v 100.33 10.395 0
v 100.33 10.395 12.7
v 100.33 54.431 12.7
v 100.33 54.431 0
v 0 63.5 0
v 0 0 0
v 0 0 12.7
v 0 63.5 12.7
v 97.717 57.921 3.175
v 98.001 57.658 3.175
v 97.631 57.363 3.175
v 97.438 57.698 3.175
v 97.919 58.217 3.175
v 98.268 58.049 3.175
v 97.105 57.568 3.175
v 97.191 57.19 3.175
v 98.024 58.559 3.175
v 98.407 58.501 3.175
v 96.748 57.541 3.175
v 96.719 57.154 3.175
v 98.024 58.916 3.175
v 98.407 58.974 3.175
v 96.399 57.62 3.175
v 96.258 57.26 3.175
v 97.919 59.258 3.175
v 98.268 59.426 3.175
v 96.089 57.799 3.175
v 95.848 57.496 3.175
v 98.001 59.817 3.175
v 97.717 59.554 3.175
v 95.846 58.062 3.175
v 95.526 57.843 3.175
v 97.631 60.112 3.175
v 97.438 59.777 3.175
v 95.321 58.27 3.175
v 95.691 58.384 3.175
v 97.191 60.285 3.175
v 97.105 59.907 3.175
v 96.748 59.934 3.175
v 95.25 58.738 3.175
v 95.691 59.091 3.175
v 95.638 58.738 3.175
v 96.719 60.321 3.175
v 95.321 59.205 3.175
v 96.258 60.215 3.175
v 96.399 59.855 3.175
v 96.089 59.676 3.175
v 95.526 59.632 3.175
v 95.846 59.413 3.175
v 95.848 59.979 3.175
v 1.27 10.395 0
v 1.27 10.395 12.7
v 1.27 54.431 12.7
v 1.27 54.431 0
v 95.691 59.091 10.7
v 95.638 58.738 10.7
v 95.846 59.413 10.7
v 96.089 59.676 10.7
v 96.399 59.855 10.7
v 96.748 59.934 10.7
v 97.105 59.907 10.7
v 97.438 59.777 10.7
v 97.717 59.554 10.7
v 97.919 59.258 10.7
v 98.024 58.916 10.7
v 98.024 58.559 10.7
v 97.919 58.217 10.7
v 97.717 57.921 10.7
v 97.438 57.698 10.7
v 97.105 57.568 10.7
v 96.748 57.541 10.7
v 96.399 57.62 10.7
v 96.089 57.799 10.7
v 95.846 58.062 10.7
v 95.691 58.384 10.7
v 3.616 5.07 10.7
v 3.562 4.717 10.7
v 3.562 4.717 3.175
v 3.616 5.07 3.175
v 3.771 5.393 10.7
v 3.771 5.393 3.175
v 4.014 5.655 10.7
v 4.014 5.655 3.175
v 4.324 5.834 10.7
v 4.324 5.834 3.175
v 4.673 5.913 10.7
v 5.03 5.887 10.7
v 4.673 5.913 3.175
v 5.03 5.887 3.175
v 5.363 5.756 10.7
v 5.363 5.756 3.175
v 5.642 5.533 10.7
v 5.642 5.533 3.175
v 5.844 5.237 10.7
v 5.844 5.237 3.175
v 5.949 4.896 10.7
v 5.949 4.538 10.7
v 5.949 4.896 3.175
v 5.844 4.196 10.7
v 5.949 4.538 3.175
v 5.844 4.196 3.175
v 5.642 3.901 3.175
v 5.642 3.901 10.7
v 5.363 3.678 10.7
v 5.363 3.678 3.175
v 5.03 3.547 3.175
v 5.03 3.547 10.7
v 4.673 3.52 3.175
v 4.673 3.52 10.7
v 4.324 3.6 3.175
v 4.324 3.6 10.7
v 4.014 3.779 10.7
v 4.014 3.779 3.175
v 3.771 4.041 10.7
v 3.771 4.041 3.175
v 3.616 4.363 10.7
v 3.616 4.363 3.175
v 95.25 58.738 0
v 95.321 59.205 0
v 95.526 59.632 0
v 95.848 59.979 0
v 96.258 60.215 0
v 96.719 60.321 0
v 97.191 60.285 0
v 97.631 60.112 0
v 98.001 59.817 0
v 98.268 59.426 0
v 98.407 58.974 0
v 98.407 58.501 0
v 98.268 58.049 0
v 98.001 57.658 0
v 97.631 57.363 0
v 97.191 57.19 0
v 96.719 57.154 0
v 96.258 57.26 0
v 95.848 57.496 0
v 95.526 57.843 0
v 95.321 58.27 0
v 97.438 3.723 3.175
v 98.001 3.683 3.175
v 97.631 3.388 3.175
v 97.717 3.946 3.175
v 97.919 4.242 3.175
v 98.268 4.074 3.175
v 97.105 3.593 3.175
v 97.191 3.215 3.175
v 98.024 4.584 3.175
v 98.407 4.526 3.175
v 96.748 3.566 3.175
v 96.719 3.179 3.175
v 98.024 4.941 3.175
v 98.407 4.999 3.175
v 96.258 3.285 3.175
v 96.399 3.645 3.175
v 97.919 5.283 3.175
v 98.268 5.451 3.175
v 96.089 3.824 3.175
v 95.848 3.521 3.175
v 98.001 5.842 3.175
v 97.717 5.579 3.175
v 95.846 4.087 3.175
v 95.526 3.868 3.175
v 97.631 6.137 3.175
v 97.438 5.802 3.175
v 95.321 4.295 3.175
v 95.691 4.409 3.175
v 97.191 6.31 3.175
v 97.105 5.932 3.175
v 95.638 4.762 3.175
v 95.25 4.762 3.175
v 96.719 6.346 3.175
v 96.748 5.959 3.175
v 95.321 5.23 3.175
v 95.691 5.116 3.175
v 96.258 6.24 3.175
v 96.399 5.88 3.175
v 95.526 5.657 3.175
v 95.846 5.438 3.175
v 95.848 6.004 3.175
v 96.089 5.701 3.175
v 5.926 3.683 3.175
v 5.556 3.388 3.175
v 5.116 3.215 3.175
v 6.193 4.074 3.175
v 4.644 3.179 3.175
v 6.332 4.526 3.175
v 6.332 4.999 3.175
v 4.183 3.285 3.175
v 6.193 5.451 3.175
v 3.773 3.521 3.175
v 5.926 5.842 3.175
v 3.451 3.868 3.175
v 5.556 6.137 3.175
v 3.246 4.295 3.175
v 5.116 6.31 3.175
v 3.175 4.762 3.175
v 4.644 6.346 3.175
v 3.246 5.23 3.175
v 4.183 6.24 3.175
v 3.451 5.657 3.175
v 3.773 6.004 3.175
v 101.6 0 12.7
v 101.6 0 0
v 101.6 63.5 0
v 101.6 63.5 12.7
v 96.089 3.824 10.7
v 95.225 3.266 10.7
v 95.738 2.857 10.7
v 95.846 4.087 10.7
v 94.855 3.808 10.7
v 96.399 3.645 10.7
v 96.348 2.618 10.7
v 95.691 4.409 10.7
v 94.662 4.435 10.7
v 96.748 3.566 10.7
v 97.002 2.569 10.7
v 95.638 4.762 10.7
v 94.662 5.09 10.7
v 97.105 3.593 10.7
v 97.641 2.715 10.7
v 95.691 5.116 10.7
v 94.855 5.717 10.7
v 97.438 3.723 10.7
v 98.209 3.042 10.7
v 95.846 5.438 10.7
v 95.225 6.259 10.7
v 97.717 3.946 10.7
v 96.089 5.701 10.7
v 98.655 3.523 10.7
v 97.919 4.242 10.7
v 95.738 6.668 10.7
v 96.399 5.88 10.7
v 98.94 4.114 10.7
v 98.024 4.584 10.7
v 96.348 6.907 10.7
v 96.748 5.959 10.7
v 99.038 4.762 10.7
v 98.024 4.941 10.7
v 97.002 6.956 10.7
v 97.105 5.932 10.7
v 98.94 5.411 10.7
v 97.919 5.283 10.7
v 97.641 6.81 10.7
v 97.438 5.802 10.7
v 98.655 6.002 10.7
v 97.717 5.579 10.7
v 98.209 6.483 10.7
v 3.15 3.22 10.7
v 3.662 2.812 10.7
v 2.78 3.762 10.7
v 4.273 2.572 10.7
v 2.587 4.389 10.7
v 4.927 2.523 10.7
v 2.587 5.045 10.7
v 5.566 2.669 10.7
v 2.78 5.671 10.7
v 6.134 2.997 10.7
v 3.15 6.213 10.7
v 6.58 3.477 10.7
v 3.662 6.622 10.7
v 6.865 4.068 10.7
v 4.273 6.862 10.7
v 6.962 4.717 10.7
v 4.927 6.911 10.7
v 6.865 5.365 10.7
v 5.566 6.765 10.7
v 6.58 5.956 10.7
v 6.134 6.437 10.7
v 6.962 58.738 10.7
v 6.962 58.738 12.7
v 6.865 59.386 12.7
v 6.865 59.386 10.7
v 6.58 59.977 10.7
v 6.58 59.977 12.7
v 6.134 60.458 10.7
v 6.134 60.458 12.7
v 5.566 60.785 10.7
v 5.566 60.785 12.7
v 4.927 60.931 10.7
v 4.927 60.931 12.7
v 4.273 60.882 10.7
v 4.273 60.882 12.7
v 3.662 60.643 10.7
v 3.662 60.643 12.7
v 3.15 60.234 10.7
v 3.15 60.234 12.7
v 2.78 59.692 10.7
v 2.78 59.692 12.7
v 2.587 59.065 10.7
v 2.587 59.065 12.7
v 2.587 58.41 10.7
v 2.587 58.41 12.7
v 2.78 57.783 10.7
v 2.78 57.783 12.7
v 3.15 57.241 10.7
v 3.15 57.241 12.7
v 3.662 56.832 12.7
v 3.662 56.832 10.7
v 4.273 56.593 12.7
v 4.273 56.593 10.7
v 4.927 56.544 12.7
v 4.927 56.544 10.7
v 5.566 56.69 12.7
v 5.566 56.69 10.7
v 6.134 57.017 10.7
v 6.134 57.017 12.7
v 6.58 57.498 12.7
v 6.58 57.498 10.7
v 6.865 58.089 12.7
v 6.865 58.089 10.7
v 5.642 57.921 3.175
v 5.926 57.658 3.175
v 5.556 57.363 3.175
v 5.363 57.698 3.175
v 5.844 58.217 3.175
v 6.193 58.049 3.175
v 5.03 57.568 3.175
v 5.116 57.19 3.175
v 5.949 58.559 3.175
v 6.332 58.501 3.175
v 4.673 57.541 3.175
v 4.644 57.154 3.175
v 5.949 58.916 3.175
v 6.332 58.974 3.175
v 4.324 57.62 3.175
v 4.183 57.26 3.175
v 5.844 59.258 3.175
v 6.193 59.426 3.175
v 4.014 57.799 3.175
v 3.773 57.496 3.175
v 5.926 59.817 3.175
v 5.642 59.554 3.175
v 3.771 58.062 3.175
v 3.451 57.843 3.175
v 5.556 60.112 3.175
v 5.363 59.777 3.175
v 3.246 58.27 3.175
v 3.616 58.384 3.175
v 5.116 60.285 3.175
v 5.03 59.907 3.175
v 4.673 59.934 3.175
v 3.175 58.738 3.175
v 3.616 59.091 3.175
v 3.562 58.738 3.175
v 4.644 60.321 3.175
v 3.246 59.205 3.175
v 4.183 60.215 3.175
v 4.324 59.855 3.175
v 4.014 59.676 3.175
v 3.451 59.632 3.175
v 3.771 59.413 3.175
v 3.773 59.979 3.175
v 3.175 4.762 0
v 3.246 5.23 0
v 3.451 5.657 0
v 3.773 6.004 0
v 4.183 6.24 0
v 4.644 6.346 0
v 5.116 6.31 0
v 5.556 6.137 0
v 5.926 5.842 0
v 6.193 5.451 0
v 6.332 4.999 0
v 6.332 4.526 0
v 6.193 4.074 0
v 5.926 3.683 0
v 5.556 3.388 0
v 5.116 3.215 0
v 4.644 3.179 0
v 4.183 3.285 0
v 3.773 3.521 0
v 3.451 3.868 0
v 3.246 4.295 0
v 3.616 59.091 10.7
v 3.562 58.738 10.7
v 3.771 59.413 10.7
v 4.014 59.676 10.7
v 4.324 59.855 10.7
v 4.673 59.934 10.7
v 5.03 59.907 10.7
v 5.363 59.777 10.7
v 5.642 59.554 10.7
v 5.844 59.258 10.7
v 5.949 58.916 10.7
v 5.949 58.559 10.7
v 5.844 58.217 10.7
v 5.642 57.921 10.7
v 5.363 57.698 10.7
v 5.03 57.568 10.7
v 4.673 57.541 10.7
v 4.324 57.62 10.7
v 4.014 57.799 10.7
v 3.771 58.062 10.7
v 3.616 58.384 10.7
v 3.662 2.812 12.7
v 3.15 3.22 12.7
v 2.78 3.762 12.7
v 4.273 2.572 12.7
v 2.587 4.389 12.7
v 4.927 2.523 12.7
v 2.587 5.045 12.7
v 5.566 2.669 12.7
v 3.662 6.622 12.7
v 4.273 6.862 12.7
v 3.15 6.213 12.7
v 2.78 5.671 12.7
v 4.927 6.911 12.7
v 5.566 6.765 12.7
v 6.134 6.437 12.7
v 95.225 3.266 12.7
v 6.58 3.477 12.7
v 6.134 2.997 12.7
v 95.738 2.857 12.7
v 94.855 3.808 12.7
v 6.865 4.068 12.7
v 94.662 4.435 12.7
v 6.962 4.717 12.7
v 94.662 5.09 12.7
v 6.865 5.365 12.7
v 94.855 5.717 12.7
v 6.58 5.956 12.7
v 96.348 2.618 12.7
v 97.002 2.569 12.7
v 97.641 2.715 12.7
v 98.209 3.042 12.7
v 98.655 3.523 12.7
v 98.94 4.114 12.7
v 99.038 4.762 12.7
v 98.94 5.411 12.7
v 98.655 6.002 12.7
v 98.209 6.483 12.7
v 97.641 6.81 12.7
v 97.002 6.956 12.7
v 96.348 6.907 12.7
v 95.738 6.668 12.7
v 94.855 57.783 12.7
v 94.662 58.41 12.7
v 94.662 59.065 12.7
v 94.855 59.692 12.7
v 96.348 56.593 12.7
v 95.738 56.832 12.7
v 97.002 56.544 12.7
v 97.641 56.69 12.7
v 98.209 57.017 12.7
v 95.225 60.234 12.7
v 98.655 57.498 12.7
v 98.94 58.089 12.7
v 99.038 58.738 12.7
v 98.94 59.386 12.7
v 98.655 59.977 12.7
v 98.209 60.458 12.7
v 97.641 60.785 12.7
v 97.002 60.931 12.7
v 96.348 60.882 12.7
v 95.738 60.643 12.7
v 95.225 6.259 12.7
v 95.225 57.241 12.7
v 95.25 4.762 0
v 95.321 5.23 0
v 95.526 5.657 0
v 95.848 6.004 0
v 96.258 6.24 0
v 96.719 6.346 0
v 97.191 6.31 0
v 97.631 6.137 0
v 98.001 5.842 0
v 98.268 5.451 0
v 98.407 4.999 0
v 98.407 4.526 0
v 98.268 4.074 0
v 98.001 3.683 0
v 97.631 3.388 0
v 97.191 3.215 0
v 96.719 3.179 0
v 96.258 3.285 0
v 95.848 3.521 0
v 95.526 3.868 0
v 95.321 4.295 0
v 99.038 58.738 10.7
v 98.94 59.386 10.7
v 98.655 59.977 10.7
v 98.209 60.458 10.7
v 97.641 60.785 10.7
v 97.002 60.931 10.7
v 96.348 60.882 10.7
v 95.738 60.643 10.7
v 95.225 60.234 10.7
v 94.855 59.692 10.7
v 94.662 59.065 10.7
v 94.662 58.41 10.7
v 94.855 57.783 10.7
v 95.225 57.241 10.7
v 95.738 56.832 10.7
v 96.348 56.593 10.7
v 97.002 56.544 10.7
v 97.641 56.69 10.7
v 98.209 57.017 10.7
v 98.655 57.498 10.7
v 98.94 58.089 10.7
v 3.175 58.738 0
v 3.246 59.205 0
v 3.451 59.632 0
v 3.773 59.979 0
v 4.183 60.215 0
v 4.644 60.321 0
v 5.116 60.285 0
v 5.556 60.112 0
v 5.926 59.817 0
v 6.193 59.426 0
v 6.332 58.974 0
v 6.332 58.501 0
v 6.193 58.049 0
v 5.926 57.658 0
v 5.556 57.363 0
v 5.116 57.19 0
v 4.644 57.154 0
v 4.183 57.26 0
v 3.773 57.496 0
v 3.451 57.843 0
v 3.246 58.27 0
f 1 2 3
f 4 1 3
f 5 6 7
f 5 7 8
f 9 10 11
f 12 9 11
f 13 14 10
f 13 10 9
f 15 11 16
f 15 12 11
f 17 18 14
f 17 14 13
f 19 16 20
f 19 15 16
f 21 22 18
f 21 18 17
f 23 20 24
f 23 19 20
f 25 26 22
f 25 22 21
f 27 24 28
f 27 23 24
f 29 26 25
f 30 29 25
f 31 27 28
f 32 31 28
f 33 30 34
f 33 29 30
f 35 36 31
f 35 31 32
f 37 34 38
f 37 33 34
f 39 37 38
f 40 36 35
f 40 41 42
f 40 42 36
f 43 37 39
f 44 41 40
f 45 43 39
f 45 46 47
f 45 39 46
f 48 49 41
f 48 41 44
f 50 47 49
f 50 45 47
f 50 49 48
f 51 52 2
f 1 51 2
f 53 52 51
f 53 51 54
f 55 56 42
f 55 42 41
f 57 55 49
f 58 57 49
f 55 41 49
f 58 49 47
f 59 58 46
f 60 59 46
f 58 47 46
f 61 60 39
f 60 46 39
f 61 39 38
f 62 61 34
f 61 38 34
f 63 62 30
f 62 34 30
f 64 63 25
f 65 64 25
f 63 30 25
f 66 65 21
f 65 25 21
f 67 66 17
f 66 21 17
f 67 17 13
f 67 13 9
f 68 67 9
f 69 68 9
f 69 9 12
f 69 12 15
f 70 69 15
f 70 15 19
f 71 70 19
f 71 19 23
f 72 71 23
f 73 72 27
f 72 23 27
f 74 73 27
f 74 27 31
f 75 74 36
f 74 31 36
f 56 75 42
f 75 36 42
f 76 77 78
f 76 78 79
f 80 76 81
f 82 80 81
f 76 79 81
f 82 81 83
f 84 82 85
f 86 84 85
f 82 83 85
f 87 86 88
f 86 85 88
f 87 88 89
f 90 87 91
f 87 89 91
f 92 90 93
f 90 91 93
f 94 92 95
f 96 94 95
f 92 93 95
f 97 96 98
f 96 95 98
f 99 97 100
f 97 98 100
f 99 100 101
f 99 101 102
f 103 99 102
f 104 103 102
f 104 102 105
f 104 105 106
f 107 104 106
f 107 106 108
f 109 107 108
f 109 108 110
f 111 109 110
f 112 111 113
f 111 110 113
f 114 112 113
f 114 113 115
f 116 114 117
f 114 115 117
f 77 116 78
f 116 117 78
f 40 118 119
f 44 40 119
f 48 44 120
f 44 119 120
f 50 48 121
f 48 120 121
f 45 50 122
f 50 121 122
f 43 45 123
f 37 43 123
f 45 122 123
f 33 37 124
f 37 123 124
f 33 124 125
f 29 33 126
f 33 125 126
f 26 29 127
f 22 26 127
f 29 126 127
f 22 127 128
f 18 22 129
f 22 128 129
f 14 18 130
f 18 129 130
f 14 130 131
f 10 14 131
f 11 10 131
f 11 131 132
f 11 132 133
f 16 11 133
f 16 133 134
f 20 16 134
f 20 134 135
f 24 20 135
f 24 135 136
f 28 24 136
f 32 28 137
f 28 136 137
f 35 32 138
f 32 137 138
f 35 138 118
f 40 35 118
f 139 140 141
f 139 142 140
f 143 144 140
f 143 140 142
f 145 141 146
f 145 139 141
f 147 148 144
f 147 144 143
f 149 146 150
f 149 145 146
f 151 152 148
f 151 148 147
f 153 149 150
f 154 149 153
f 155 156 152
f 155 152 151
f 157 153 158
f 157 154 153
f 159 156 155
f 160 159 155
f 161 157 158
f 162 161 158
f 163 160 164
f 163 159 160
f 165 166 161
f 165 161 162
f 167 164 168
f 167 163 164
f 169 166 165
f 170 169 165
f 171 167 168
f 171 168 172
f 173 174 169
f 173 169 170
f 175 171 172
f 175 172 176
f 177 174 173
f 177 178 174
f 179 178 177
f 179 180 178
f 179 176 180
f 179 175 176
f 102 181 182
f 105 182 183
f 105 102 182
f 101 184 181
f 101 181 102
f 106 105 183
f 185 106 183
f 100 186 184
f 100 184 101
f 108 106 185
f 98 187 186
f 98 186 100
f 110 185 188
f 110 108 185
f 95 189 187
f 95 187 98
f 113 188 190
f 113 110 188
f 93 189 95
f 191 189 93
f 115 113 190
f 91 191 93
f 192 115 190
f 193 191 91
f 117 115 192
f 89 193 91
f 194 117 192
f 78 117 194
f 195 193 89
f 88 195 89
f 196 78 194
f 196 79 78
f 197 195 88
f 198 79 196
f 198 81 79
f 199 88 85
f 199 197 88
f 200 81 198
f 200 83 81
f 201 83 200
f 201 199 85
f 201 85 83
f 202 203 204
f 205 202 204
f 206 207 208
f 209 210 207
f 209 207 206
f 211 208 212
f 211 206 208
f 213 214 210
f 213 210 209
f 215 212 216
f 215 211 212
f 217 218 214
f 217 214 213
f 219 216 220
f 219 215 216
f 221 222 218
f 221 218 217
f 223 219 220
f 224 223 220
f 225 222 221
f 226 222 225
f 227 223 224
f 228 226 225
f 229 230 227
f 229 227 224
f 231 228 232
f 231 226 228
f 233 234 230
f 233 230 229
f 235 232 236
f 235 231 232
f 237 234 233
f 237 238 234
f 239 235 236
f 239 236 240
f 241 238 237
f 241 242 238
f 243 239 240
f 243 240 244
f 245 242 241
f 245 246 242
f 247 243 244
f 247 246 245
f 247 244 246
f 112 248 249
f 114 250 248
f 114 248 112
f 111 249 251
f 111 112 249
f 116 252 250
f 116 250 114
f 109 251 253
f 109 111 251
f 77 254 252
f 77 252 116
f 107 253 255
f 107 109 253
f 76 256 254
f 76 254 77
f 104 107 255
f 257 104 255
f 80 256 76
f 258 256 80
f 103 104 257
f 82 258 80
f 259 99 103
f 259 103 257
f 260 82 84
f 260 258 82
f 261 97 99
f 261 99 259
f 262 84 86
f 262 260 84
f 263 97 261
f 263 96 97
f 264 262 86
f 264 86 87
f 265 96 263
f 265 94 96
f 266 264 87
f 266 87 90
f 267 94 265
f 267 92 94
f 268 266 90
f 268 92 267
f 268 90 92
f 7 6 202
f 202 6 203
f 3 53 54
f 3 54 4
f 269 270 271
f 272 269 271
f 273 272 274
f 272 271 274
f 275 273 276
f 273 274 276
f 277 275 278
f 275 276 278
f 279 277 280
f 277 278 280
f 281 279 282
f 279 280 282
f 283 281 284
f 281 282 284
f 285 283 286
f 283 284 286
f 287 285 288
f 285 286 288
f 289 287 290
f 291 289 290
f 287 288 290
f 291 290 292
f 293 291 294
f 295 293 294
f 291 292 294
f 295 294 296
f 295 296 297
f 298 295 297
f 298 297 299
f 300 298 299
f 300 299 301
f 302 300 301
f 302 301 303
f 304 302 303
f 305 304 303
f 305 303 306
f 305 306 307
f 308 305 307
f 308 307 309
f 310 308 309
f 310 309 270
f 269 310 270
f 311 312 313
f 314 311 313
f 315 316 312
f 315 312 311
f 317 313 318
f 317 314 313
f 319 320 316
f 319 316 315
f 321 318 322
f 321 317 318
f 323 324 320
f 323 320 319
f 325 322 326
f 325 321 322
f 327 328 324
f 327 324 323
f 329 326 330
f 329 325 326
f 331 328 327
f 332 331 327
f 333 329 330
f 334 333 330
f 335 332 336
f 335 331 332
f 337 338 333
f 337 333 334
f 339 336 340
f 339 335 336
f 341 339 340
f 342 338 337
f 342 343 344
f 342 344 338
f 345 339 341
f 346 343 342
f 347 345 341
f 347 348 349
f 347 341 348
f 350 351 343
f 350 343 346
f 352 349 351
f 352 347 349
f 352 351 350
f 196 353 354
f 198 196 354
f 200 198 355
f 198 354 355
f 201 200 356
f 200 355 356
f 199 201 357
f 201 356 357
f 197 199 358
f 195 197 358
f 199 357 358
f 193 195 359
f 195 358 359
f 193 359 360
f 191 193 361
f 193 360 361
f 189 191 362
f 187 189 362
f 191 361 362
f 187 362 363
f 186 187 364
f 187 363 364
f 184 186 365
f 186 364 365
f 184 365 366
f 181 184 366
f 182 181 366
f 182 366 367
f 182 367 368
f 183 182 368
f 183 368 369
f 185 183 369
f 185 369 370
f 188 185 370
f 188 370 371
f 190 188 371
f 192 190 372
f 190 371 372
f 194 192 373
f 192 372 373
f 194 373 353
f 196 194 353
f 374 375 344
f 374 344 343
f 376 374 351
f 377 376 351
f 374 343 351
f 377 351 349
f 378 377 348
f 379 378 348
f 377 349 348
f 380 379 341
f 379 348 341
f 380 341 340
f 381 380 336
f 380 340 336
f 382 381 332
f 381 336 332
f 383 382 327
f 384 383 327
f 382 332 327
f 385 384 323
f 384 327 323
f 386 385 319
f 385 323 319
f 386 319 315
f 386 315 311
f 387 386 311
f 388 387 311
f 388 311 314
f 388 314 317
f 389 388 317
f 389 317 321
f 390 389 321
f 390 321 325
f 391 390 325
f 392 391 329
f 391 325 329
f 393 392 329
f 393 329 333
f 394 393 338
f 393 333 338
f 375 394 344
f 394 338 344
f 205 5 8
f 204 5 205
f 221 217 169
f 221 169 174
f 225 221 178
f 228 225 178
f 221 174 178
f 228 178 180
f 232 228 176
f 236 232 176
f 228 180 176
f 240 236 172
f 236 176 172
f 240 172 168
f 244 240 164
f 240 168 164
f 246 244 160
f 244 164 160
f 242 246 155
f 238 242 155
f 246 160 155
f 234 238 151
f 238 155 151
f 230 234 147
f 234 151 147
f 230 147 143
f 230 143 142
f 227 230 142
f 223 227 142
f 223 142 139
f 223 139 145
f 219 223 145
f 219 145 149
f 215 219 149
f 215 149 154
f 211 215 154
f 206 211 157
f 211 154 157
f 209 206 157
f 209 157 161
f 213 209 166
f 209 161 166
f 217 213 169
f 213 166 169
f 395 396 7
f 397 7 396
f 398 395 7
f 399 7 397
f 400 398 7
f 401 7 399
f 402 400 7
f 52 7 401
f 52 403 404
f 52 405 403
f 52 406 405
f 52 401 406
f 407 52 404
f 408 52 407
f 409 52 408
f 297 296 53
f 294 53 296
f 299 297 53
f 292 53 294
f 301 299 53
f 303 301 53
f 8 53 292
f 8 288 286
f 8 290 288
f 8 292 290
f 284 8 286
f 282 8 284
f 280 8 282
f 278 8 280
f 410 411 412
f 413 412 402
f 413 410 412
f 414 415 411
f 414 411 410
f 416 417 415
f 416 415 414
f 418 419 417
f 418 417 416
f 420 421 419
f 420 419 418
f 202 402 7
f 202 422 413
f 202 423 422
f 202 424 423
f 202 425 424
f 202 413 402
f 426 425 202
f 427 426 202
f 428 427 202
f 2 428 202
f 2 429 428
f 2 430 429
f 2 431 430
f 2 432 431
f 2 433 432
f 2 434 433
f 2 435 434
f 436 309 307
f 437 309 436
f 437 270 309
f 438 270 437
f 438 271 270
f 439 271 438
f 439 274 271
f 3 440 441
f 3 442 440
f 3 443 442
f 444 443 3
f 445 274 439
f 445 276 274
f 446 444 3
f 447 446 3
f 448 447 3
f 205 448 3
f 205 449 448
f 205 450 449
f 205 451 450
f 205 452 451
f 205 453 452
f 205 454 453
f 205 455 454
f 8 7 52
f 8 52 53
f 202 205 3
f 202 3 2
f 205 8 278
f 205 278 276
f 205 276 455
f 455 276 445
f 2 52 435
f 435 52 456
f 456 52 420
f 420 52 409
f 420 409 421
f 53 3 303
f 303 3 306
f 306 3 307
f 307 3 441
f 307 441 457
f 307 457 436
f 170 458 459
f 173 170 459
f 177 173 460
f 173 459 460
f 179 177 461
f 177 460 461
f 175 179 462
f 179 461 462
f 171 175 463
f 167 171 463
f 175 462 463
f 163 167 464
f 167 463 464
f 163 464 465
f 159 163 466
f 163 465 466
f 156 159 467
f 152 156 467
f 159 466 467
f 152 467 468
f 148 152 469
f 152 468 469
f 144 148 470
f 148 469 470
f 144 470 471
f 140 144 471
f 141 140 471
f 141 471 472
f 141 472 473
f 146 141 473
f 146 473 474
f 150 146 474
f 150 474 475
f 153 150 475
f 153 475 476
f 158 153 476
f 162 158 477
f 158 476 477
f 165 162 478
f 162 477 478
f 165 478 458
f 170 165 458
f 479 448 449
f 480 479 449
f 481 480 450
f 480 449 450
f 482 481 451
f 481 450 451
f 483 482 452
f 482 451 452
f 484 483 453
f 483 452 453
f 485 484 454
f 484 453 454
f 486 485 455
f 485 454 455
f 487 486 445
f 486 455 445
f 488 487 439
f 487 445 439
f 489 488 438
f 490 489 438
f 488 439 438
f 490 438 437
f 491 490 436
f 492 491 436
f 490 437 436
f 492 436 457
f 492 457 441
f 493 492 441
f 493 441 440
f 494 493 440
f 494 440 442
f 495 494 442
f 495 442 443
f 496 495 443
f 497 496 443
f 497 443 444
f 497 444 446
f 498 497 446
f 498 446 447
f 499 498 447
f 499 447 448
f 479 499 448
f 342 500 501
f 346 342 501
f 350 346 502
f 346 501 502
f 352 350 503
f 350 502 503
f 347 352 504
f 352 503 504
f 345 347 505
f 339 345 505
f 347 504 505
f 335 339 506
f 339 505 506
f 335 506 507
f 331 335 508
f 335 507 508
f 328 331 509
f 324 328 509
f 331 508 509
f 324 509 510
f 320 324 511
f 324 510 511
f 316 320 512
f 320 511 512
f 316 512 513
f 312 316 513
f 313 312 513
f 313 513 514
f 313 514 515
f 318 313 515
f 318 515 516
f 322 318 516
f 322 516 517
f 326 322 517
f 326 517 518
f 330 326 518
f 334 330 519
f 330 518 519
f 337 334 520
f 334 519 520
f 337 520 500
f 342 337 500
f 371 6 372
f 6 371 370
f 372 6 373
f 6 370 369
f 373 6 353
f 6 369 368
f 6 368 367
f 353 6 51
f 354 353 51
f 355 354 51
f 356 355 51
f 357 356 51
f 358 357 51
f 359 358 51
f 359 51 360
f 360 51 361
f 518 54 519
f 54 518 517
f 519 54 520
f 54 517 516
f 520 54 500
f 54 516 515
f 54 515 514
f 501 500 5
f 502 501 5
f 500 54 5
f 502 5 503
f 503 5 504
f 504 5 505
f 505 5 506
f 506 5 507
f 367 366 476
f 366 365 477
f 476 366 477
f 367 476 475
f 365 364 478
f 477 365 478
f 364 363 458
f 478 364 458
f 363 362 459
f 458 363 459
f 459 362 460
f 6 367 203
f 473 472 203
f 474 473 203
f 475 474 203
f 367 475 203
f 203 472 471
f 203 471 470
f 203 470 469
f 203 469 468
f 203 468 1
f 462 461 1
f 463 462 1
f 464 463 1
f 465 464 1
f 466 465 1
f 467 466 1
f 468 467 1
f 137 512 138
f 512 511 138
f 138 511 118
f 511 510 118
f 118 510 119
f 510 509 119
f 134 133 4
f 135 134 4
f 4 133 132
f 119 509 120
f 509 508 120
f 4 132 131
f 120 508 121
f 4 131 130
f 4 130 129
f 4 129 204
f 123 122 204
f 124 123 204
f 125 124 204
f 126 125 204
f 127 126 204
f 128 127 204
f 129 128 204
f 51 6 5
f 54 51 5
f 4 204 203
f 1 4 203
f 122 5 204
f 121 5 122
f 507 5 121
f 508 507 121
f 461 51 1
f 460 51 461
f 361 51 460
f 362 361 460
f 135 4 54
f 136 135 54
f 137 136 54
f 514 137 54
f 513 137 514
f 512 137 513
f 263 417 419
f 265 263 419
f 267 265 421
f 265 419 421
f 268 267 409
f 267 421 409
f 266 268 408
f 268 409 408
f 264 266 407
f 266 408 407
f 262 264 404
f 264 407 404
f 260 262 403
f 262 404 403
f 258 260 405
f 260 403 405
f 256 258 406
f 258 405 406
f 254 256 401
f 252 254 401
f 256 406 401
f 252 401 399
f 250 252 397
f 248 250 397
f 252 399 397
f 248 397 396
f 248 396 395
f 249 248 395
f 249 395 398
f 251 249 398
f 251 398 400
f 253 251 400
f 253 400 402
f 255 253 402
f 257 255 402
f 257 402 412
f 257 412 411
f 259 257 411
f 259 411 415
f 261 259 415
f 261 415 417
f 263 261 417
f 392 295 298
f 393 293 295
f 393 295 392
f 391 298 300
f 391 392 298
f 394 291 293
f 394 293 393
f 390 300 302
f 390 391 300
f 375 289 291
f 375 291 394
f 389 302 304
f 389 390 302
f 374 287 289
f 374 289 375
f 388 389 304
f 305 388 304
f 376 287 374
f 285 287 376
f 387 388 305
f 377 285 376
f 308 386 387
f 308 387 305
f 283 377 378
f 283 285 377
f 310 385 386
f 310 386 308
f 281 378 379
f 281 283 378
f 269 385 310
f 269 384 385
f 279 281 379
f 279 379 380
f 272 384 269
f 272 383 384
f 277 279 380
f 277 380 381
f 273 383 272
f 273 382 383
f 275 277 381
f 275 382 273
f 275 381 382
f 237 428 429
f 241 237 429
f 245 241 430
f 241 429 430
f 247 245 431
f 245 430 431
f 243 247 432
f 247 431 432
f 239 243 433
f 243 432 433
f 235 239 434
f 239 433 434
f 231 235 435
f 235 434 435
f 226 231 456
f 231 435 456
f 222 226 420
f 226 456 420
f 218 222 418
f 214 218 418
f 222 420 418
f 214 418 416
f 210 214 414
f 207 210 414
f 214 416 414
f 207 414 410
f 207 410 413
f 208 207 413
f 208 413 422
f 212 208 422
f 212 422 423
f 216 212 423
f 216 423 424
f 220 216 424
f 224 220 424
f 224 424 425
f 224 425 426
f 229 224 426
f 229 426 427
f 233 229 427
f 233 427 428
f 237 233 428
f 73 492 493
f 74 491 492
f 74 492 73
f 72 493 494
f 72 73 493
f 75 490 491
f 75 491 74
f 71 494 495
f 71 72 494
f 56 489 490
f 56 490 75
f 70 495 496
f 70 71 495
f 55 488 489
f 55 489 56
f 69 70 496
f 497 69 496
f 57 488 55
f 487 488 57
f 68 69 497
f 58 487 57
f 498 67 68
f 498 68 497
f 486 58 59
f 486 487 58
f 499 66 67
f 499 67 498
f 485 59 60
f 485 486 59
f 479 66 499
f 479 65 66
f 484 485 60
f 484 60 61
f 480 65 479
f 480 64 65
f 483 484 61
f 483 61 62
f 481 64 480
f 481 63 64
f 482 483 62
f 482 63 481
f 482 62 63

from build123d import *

# Parameters (mm, degrees)
SKETCH1_W                      = 101.6
SKETCH1_H                      = 63.5
BOSS_EXTRUDE1_DEPTH            = 12.7
SKETCH2_W                      = 99.06
SKETCH2_H                      = 44.03588005
CUT_EXTRUDE1_DEPTH             = 12.7
SKETCH3_R                      = 1.5875
CUT_EXTRUDE2_DEPTH             = 3.175
CBORE_FOR_M2_SHCS1_D           = 2.4
CBORE_FOR_M2_SHCS1_CBORE_D     = 4.4
CBORE_FOR_M2_SHCS1_CBORE_DEPTH = 2


with BuildPart() as part:
    # Sketch1 → Boss-Extrude1 (new body)
    with BuildSketch(Plane.XY):
        with Locations((50.8, 31.75)):
            Rectangle(SKETCH1_W, SKETCH1_H)
    extrude(amount=BOSS_EXTRUDE1_DEPTH)

    # Sketch2 → Cut-Extrude1 (cut)
    with BuildSketch(Plane.XY.offset(12.7)):
        with Locations((50.8, 32.4134102)):
            Rectangle(SKETCH2_W, SKETCH2_H)
    extrude(amount=-CUT_EXTRUDE1_DEPTH, mode=Mode.SUBTRACT)

    # Sketch3 → Cut-Extrude2 (cut)
    with BuildSketch(Plane(origin=(0, 0, 0), x_dir=(-1, 0, 0), z_dir=(0, 0, -1))):
        with Locations((-96.8375, 4.7625)):
            Circle(SKETCH3_R)
        with Locations((-96.8375, 58.7375)):
            Circle(SKETCH3_R)
        with Locations((-4.7625, 58.7375)):
            Circle(SKETCH3_R)
        with Locations((-4.7625, 4.7625)):
            Circle(SKETCH3_R)
    extrude(amount=-CUT_EXTRUDE2_DEPTH, mode=Mode.SUBTRACT)

    # CBORE for M2 SHCS1 (through all)
    with Locations(Plane.XY.offset(12.7)):
        with Locations((96.8375, 4.7625), (96.8375, 58.7375), (4.7625, 58.7375), (4.7625, 4.71678)):
            CounterBoreHole(CBORE_FOR_M2_SHCS1_D / 2, CBORE_FOR_M2_SHCS1_CBORE_D / 2, CBORE_FOR_M2_SHCS1_CBORE_DEPTH)


solid = part.part
